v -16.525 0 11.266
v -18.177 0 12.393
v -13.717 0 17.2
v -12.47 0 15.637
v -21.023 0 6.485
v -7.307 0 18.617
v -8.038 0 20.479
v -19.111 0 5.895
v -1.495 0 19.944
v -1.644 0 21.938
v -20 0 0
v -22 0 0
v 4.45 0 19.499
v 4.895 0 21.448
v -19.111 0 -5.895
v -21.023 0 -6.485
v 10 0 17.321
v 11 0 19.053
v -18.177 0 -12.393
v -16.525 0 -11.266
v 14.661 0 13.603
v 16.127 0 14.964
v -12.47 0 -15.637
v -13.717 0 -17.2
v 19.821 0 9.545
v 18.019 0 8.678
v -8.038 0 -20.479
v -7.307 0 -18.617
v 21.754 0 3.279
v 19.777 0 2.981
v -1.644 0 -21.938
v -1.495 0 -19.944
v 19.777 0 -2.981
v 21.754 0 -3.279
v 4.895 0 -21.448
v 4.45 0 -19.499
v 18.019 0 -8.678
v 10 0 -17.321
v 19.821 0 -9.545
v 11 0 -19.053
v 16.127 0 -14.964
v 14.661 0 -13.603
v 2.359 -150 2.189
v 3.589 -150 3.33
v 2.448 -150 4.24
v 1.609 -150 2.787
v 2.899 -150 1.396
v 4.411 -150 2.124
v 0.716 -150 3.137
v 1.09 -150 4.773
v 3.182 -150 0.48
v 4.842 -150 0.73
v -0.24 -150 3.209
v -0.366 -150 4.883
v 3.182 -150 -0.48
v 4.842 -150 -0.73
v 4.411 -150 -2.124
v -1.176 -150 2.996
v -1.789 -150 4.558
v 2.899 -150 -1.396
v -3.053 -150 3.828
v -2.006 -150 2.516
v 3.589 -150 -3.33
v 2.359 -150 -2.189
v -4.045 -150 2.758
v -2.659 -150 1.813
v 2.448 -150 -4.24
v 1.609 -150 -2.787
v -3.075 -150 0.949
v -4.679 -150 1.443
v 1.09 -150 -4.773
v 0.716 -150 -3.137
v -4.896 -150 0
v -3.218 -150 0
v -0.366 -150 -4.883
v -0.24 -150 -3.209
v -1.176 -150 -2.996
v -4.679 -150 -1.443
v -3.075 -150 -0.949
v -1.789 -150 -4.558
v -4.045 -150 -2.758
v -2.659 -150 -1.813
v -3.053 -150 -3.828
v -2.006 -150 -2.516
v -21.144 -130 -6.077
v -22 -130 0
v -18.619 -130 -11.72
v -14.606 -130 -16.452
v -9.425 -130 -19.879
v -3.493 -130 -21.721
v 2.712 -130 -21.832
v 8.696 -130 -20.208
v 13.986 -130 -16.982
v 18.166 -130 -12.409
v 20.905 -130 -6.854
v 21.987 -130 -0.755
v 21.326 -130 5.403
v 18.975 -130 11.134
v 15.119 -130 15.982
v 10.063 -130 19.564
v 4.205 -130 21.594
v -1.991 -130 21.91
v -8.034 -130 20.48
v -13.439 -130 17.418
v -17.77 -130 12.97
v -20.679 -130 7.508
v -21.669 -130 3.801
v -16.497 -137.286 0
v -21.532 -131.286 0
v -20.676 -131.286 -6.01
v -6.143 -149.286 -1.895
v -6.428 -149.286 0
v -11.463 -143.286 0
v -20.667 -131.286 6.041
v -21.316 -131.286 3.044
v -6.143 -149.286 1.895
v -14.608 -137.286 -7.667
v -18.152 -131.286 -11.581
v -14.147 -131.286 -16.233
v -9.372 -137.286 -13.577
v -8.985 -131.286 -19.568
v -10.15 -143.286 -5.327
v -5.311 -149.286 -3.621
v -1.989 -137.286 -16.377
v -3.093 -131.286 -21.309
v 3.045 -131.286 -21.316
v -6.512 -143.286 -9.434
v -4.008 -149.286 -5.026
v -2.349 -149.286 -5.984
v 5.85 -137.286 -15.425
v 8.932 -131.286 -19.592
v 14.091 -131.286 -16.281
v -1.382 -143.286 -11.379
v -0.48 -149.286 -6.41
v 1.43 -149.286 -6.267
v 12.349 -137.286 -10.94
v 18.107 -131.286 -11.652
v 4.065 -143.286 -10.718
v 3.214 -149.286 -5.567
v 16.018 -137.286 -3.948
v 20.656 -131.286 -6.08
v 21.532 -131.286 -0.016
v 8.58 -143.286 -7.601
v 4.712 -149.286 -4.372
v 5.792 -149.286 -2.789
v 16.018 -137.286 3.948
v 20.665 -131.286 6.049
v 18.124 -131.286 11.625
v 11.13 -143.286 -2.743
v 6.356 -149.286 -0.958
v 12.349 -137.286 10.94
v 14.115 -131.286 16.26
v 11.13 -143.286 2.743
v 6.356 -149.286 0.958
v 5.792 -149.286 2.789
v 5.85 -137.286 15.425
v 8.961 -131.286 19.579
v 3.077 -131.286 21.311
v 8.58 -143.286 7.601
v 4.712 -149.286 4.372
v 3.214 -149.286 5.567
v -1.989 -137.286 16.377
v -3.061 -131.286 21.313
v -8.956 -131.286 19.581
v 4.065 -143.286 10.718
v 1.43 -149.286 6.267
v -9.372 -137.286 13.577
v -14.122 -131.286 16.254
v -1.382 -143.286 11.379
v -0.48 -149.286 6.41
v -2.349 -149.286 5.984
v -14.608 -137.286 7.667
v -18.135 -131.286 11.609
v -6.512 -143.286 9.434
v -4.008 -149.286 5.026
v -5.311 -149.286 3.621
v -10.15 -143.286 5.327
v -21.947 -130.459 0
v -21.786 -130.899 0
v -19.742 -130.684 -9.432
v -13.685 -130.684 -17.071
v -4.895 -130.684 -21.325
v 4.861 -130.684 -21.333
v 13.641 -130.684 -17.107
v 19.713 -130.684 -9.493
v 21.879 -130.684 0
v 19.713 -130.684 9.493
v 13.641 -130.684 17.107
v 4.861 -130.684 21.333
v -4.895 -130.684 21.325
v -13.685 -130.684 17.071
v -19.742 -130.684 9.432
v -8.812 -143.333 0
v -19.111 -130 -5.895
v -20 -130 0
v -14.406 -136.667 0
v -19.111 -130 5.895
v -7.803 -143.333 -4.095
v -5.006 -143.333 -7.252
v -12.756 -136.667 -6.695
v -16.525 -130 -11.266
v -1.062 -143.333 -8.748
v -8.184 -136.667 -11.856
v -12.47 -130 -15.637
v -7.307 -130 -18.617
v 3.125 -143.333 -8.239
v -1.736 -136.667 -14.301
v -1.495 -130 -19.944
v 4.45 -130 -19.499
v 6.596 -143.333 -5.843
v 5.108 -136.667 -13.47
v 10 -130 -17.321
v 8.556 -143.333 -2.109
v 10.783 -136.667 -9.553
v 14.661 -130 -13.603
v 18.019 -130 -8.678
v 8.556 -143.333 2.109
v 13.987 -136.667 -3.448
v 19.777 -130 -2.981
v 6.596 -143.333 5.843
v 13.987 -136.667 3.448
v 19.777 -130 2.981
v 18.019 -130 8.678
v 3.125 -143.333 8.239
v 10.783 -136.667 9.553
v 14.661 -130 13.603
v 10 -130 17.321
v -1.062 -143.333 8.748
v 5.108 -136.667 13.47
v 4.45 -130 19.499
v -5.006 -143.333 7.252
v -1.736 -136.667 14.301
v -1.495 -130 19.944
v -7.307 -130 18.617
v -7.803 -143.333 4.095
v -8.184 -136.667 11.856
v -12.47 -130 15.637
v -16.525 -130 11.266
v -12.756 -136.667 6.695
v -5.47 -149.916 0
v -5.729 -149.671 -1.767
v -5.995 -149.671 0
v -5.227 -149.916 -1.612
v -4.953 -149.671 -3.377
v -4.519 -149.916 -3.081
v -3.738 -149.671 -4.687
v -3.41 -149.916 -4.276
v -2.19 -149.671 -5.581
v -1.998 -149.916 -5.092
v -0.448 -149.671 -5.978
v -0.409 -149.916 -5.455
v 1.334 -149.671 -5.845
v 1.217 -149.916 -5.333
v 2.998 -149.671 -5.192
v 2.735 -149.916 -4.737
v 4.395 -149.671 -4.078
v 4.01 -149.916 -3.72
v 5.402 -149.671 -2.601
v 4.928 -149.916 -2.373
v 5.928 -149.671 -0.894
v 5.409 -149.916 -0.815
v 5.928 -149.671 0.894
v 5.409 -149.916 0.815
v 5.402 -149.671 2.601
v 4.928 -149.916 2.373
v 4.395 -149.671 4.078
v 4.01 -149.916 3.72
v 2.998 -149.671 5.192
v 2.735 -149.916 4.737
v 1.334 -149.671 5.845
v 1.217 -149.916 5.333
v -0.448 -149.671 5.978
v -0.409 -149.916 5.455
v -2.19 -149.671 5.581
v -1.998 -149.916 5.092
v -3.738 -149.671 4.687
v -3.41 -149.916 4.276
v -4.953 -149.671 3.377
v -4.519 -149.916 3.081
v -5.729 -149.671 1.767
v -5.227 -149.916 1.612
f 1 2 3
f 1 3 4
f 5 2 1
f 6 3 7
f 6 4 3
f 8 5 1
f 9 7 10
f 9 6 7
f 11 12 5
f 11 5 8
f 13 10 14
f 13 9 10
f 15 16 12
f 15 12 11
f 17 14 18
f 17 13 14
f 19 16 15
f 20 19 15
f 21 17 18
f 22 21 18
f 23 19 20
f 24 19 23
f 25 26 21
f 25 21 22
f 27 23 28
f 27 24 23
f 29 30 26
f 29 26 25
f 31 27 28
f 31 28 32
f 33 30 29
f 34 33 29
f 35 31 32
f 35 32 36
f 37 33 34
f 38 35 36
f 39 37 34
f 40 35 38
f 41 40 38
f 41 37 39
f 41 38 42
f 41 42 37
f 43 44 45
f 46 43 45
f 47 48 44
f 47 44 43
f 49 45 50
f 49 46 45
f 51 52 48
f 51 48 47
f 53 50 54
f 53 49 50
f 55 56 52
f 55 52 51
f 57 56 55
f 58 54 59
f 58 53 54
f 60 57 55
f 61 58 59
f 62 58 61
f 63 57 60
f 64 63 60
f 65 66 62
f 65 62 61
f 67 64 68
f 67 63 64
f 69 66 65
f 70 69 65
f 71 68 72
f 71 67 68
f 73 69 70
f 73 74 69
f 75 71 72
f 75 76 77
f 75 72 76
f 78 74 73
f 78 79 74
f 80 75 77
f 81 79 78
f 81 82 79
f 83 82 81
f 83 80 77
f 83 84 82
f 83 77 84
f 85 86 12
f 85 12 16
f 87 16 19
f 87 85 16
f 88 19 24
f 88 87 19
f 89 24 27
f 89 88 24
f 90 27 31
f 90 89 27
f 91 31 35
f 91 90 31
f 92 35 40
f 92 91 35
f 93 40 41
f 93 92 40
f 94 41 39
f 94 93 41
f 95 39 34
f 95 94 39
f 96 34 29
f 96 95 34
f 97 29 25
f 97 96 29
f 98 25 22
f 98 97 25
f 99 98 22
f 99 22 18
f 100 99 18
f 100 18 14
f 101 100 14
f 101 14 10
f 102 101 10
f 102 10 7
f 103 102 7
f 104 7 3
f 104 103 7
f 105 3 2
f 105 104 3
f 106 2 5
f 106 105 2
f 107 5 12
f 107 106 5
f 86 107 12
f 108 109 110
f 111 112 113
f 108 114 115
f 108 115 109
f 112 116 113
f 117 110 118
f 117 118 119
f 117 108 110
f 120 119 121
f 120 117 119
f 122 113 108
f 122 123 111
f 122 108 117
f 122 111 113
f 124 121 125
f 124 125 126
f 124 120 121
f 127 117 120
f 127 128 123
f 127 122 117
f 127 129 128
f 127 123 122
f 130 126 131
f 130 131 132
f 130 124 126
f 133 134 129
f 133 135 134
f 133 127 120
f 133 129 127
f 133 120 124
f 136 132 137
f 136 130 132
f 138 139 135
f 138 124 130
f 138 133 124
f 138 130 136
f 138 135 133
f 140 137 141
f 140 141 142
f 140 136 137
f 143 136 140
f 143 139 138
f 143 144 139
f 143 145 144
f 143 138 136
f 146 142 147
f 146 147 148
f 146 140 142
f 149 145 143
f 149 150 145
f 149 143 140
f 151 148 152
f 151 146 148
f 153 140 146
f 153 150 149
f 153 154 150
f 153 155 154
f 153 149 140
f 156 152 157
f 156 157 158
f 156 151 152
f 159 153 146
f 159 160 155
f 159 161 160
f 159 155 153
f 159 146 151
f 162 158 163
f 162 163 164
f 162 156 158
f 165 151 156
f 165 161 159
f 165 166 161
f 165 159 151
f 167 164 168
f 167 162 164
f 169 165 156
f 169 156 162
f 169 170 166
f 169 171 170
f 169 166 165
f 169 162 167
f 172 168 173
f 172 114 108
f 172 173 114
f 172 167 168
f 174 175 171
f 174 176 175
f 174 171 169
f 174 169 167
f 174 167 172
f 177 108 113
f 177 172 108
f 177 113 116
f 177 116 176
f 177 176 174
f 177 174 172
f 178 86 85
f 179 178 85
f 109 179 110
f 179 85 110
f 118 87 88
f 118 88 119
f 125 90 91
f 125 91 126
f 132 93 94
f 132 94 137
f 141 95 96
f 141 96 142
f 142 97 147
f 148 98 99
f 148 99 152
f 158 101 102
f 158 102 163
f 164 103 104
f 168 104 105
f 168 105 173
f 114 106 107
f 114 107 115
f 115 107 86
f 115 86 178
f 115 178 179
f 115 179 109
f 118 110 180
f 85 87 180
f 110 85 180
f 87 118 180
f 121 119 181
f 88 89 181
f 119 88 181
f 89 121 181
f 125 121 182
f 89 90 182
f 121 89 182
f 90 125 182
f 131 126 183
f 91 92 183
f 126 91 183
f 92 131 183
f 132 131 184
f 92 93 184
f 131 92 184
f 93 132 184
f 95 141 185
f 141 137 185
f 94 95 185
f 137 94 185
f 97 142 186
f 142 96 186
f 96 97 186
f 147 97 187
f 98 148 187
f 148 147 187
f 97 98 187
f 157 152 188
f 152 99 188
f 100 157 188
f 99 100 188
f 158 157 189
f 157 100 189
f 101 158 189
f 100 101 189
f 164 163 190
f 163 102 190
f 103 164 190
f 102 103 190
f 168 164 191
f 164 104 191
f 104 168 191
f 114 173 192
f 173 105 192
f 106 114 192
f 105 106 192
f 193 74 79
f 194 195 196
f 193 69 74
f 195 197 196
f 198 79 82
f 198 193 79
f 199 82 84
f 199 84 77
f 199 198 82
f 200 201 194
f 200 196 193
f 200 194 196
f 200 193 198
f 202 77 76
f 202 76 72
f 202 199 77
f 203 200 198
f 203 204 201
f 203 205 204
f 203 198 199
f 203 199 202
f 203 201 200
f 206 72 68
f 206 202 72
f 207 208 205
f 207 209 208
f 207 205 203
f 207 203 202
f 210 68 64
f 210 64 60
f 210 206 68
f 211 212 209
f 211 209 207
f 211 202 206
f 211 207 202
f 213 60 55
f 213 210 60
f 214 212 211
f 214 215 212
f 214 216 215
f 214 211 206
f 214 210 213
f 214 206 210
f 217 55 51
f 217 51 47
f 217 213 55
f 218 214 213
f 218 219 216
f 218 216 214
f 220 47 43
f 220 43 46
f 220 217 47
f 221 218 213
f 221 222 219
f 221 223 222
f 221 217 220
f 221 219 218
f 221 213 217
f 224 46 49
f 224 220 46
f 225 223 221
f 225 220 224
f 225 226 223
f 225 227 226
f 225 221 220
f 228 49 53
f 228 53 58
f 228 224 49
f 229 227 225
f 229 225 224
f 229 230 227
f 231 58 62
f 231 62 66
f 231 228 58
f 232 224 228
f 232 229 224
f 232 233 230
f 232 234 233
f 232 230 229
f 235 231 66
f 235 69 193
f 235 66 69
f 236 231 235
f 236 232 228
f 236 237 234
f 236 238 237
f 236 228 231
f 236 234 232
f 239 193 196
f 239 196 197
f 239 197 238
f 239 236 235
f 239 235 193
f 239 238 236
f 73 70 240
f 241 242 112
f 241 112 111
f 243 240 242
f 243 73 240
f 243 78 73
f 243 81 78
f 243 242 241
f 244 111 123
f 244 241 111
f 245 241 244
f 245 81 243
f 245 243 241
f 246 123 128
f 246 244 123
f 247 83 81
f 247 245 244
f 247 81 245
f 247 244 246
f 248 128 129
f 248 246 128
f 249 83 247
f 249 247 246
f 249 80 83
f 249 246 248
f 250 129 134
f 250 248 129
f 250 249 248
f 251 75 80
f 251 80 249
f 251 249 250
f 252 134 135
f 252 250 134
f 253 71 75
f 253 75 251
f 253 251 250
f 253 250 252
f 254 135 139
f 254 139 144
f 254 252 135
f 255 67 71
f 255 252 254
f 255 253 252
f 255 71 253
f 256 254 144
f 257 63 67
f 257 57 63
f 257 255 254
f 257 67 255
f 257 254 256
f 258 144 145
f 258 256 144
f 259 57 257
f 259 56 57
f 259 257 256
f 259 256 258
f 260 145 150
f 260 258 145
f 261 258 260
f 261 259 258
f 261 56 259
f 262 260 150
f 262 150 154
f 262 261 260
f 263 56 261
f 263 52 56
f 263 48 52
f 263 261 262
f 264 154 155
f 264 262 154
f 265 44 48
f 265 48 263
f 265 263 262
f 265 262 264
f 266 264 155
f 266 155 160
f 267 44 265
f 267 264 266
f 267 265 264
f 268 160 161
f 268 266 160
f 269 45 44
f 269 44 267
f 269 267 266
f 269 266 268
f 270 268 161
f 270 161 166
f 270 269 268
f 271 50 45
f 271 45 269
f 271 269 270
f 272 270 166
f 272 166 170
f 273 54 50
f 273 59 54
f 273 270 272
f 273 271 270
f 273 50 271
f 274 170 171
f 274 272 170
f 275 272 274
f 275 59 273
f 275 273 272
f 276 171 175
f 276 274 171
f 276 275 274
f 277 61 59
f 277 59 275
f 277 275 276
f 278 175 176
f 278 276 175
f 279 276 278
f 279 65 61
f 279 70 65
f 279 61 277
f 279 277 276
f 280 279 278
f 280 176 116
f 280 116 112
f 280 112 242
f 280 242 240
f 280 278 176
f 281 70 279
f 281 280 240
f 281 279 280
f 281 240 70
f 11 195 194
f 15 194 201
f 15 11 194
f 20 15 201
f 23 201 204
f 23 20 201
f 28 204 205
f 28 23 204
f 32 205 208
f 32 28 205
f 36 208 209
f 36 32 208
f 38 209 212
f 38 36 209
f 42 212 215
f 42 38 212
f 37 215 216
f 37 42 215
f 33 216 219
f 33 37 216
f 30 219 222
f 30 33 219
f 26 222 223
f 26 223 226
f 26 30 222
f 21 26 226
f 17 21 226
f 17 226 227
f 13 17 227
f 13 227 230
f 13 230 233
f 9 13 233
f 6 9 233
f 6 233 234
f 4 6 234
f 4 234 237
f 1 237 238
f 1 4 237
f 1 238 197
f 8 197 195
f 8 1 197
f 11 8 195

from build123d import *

# Parameters (mm, degrees)
FILLET1_R = 2
FILLET3_R = 2


with BuildPart() as part:
    # Sketch1 → Revolve1 (revolve)
    with BuildSketch(Plane.XY):
        Polygon((-22, 0), (-22, -130.727940469), (-5.828821955, -150), (-3.218007376, -150), (-20, -130), (-20, 0), align=None)
    revolve(axis=Axis((0, 0, 0), (0, -1, 0)))

    # Fillet1
    fillet1_edges = [part.edges().sort_by_distance(p)[0] for p in [
        (22, -130.727940469, 0),
    ]]
    fillet(fillet1_edges, radius=FILLET1_R)

    # Fillet3
    fillet3_edges = [part.edges().sort_by_distance(p)[0] for p in [
        (5.828821955, -150, 0),
    ]]
    fillet(fillet3_edges, radius=FILLET3_R)


solid = part.part
